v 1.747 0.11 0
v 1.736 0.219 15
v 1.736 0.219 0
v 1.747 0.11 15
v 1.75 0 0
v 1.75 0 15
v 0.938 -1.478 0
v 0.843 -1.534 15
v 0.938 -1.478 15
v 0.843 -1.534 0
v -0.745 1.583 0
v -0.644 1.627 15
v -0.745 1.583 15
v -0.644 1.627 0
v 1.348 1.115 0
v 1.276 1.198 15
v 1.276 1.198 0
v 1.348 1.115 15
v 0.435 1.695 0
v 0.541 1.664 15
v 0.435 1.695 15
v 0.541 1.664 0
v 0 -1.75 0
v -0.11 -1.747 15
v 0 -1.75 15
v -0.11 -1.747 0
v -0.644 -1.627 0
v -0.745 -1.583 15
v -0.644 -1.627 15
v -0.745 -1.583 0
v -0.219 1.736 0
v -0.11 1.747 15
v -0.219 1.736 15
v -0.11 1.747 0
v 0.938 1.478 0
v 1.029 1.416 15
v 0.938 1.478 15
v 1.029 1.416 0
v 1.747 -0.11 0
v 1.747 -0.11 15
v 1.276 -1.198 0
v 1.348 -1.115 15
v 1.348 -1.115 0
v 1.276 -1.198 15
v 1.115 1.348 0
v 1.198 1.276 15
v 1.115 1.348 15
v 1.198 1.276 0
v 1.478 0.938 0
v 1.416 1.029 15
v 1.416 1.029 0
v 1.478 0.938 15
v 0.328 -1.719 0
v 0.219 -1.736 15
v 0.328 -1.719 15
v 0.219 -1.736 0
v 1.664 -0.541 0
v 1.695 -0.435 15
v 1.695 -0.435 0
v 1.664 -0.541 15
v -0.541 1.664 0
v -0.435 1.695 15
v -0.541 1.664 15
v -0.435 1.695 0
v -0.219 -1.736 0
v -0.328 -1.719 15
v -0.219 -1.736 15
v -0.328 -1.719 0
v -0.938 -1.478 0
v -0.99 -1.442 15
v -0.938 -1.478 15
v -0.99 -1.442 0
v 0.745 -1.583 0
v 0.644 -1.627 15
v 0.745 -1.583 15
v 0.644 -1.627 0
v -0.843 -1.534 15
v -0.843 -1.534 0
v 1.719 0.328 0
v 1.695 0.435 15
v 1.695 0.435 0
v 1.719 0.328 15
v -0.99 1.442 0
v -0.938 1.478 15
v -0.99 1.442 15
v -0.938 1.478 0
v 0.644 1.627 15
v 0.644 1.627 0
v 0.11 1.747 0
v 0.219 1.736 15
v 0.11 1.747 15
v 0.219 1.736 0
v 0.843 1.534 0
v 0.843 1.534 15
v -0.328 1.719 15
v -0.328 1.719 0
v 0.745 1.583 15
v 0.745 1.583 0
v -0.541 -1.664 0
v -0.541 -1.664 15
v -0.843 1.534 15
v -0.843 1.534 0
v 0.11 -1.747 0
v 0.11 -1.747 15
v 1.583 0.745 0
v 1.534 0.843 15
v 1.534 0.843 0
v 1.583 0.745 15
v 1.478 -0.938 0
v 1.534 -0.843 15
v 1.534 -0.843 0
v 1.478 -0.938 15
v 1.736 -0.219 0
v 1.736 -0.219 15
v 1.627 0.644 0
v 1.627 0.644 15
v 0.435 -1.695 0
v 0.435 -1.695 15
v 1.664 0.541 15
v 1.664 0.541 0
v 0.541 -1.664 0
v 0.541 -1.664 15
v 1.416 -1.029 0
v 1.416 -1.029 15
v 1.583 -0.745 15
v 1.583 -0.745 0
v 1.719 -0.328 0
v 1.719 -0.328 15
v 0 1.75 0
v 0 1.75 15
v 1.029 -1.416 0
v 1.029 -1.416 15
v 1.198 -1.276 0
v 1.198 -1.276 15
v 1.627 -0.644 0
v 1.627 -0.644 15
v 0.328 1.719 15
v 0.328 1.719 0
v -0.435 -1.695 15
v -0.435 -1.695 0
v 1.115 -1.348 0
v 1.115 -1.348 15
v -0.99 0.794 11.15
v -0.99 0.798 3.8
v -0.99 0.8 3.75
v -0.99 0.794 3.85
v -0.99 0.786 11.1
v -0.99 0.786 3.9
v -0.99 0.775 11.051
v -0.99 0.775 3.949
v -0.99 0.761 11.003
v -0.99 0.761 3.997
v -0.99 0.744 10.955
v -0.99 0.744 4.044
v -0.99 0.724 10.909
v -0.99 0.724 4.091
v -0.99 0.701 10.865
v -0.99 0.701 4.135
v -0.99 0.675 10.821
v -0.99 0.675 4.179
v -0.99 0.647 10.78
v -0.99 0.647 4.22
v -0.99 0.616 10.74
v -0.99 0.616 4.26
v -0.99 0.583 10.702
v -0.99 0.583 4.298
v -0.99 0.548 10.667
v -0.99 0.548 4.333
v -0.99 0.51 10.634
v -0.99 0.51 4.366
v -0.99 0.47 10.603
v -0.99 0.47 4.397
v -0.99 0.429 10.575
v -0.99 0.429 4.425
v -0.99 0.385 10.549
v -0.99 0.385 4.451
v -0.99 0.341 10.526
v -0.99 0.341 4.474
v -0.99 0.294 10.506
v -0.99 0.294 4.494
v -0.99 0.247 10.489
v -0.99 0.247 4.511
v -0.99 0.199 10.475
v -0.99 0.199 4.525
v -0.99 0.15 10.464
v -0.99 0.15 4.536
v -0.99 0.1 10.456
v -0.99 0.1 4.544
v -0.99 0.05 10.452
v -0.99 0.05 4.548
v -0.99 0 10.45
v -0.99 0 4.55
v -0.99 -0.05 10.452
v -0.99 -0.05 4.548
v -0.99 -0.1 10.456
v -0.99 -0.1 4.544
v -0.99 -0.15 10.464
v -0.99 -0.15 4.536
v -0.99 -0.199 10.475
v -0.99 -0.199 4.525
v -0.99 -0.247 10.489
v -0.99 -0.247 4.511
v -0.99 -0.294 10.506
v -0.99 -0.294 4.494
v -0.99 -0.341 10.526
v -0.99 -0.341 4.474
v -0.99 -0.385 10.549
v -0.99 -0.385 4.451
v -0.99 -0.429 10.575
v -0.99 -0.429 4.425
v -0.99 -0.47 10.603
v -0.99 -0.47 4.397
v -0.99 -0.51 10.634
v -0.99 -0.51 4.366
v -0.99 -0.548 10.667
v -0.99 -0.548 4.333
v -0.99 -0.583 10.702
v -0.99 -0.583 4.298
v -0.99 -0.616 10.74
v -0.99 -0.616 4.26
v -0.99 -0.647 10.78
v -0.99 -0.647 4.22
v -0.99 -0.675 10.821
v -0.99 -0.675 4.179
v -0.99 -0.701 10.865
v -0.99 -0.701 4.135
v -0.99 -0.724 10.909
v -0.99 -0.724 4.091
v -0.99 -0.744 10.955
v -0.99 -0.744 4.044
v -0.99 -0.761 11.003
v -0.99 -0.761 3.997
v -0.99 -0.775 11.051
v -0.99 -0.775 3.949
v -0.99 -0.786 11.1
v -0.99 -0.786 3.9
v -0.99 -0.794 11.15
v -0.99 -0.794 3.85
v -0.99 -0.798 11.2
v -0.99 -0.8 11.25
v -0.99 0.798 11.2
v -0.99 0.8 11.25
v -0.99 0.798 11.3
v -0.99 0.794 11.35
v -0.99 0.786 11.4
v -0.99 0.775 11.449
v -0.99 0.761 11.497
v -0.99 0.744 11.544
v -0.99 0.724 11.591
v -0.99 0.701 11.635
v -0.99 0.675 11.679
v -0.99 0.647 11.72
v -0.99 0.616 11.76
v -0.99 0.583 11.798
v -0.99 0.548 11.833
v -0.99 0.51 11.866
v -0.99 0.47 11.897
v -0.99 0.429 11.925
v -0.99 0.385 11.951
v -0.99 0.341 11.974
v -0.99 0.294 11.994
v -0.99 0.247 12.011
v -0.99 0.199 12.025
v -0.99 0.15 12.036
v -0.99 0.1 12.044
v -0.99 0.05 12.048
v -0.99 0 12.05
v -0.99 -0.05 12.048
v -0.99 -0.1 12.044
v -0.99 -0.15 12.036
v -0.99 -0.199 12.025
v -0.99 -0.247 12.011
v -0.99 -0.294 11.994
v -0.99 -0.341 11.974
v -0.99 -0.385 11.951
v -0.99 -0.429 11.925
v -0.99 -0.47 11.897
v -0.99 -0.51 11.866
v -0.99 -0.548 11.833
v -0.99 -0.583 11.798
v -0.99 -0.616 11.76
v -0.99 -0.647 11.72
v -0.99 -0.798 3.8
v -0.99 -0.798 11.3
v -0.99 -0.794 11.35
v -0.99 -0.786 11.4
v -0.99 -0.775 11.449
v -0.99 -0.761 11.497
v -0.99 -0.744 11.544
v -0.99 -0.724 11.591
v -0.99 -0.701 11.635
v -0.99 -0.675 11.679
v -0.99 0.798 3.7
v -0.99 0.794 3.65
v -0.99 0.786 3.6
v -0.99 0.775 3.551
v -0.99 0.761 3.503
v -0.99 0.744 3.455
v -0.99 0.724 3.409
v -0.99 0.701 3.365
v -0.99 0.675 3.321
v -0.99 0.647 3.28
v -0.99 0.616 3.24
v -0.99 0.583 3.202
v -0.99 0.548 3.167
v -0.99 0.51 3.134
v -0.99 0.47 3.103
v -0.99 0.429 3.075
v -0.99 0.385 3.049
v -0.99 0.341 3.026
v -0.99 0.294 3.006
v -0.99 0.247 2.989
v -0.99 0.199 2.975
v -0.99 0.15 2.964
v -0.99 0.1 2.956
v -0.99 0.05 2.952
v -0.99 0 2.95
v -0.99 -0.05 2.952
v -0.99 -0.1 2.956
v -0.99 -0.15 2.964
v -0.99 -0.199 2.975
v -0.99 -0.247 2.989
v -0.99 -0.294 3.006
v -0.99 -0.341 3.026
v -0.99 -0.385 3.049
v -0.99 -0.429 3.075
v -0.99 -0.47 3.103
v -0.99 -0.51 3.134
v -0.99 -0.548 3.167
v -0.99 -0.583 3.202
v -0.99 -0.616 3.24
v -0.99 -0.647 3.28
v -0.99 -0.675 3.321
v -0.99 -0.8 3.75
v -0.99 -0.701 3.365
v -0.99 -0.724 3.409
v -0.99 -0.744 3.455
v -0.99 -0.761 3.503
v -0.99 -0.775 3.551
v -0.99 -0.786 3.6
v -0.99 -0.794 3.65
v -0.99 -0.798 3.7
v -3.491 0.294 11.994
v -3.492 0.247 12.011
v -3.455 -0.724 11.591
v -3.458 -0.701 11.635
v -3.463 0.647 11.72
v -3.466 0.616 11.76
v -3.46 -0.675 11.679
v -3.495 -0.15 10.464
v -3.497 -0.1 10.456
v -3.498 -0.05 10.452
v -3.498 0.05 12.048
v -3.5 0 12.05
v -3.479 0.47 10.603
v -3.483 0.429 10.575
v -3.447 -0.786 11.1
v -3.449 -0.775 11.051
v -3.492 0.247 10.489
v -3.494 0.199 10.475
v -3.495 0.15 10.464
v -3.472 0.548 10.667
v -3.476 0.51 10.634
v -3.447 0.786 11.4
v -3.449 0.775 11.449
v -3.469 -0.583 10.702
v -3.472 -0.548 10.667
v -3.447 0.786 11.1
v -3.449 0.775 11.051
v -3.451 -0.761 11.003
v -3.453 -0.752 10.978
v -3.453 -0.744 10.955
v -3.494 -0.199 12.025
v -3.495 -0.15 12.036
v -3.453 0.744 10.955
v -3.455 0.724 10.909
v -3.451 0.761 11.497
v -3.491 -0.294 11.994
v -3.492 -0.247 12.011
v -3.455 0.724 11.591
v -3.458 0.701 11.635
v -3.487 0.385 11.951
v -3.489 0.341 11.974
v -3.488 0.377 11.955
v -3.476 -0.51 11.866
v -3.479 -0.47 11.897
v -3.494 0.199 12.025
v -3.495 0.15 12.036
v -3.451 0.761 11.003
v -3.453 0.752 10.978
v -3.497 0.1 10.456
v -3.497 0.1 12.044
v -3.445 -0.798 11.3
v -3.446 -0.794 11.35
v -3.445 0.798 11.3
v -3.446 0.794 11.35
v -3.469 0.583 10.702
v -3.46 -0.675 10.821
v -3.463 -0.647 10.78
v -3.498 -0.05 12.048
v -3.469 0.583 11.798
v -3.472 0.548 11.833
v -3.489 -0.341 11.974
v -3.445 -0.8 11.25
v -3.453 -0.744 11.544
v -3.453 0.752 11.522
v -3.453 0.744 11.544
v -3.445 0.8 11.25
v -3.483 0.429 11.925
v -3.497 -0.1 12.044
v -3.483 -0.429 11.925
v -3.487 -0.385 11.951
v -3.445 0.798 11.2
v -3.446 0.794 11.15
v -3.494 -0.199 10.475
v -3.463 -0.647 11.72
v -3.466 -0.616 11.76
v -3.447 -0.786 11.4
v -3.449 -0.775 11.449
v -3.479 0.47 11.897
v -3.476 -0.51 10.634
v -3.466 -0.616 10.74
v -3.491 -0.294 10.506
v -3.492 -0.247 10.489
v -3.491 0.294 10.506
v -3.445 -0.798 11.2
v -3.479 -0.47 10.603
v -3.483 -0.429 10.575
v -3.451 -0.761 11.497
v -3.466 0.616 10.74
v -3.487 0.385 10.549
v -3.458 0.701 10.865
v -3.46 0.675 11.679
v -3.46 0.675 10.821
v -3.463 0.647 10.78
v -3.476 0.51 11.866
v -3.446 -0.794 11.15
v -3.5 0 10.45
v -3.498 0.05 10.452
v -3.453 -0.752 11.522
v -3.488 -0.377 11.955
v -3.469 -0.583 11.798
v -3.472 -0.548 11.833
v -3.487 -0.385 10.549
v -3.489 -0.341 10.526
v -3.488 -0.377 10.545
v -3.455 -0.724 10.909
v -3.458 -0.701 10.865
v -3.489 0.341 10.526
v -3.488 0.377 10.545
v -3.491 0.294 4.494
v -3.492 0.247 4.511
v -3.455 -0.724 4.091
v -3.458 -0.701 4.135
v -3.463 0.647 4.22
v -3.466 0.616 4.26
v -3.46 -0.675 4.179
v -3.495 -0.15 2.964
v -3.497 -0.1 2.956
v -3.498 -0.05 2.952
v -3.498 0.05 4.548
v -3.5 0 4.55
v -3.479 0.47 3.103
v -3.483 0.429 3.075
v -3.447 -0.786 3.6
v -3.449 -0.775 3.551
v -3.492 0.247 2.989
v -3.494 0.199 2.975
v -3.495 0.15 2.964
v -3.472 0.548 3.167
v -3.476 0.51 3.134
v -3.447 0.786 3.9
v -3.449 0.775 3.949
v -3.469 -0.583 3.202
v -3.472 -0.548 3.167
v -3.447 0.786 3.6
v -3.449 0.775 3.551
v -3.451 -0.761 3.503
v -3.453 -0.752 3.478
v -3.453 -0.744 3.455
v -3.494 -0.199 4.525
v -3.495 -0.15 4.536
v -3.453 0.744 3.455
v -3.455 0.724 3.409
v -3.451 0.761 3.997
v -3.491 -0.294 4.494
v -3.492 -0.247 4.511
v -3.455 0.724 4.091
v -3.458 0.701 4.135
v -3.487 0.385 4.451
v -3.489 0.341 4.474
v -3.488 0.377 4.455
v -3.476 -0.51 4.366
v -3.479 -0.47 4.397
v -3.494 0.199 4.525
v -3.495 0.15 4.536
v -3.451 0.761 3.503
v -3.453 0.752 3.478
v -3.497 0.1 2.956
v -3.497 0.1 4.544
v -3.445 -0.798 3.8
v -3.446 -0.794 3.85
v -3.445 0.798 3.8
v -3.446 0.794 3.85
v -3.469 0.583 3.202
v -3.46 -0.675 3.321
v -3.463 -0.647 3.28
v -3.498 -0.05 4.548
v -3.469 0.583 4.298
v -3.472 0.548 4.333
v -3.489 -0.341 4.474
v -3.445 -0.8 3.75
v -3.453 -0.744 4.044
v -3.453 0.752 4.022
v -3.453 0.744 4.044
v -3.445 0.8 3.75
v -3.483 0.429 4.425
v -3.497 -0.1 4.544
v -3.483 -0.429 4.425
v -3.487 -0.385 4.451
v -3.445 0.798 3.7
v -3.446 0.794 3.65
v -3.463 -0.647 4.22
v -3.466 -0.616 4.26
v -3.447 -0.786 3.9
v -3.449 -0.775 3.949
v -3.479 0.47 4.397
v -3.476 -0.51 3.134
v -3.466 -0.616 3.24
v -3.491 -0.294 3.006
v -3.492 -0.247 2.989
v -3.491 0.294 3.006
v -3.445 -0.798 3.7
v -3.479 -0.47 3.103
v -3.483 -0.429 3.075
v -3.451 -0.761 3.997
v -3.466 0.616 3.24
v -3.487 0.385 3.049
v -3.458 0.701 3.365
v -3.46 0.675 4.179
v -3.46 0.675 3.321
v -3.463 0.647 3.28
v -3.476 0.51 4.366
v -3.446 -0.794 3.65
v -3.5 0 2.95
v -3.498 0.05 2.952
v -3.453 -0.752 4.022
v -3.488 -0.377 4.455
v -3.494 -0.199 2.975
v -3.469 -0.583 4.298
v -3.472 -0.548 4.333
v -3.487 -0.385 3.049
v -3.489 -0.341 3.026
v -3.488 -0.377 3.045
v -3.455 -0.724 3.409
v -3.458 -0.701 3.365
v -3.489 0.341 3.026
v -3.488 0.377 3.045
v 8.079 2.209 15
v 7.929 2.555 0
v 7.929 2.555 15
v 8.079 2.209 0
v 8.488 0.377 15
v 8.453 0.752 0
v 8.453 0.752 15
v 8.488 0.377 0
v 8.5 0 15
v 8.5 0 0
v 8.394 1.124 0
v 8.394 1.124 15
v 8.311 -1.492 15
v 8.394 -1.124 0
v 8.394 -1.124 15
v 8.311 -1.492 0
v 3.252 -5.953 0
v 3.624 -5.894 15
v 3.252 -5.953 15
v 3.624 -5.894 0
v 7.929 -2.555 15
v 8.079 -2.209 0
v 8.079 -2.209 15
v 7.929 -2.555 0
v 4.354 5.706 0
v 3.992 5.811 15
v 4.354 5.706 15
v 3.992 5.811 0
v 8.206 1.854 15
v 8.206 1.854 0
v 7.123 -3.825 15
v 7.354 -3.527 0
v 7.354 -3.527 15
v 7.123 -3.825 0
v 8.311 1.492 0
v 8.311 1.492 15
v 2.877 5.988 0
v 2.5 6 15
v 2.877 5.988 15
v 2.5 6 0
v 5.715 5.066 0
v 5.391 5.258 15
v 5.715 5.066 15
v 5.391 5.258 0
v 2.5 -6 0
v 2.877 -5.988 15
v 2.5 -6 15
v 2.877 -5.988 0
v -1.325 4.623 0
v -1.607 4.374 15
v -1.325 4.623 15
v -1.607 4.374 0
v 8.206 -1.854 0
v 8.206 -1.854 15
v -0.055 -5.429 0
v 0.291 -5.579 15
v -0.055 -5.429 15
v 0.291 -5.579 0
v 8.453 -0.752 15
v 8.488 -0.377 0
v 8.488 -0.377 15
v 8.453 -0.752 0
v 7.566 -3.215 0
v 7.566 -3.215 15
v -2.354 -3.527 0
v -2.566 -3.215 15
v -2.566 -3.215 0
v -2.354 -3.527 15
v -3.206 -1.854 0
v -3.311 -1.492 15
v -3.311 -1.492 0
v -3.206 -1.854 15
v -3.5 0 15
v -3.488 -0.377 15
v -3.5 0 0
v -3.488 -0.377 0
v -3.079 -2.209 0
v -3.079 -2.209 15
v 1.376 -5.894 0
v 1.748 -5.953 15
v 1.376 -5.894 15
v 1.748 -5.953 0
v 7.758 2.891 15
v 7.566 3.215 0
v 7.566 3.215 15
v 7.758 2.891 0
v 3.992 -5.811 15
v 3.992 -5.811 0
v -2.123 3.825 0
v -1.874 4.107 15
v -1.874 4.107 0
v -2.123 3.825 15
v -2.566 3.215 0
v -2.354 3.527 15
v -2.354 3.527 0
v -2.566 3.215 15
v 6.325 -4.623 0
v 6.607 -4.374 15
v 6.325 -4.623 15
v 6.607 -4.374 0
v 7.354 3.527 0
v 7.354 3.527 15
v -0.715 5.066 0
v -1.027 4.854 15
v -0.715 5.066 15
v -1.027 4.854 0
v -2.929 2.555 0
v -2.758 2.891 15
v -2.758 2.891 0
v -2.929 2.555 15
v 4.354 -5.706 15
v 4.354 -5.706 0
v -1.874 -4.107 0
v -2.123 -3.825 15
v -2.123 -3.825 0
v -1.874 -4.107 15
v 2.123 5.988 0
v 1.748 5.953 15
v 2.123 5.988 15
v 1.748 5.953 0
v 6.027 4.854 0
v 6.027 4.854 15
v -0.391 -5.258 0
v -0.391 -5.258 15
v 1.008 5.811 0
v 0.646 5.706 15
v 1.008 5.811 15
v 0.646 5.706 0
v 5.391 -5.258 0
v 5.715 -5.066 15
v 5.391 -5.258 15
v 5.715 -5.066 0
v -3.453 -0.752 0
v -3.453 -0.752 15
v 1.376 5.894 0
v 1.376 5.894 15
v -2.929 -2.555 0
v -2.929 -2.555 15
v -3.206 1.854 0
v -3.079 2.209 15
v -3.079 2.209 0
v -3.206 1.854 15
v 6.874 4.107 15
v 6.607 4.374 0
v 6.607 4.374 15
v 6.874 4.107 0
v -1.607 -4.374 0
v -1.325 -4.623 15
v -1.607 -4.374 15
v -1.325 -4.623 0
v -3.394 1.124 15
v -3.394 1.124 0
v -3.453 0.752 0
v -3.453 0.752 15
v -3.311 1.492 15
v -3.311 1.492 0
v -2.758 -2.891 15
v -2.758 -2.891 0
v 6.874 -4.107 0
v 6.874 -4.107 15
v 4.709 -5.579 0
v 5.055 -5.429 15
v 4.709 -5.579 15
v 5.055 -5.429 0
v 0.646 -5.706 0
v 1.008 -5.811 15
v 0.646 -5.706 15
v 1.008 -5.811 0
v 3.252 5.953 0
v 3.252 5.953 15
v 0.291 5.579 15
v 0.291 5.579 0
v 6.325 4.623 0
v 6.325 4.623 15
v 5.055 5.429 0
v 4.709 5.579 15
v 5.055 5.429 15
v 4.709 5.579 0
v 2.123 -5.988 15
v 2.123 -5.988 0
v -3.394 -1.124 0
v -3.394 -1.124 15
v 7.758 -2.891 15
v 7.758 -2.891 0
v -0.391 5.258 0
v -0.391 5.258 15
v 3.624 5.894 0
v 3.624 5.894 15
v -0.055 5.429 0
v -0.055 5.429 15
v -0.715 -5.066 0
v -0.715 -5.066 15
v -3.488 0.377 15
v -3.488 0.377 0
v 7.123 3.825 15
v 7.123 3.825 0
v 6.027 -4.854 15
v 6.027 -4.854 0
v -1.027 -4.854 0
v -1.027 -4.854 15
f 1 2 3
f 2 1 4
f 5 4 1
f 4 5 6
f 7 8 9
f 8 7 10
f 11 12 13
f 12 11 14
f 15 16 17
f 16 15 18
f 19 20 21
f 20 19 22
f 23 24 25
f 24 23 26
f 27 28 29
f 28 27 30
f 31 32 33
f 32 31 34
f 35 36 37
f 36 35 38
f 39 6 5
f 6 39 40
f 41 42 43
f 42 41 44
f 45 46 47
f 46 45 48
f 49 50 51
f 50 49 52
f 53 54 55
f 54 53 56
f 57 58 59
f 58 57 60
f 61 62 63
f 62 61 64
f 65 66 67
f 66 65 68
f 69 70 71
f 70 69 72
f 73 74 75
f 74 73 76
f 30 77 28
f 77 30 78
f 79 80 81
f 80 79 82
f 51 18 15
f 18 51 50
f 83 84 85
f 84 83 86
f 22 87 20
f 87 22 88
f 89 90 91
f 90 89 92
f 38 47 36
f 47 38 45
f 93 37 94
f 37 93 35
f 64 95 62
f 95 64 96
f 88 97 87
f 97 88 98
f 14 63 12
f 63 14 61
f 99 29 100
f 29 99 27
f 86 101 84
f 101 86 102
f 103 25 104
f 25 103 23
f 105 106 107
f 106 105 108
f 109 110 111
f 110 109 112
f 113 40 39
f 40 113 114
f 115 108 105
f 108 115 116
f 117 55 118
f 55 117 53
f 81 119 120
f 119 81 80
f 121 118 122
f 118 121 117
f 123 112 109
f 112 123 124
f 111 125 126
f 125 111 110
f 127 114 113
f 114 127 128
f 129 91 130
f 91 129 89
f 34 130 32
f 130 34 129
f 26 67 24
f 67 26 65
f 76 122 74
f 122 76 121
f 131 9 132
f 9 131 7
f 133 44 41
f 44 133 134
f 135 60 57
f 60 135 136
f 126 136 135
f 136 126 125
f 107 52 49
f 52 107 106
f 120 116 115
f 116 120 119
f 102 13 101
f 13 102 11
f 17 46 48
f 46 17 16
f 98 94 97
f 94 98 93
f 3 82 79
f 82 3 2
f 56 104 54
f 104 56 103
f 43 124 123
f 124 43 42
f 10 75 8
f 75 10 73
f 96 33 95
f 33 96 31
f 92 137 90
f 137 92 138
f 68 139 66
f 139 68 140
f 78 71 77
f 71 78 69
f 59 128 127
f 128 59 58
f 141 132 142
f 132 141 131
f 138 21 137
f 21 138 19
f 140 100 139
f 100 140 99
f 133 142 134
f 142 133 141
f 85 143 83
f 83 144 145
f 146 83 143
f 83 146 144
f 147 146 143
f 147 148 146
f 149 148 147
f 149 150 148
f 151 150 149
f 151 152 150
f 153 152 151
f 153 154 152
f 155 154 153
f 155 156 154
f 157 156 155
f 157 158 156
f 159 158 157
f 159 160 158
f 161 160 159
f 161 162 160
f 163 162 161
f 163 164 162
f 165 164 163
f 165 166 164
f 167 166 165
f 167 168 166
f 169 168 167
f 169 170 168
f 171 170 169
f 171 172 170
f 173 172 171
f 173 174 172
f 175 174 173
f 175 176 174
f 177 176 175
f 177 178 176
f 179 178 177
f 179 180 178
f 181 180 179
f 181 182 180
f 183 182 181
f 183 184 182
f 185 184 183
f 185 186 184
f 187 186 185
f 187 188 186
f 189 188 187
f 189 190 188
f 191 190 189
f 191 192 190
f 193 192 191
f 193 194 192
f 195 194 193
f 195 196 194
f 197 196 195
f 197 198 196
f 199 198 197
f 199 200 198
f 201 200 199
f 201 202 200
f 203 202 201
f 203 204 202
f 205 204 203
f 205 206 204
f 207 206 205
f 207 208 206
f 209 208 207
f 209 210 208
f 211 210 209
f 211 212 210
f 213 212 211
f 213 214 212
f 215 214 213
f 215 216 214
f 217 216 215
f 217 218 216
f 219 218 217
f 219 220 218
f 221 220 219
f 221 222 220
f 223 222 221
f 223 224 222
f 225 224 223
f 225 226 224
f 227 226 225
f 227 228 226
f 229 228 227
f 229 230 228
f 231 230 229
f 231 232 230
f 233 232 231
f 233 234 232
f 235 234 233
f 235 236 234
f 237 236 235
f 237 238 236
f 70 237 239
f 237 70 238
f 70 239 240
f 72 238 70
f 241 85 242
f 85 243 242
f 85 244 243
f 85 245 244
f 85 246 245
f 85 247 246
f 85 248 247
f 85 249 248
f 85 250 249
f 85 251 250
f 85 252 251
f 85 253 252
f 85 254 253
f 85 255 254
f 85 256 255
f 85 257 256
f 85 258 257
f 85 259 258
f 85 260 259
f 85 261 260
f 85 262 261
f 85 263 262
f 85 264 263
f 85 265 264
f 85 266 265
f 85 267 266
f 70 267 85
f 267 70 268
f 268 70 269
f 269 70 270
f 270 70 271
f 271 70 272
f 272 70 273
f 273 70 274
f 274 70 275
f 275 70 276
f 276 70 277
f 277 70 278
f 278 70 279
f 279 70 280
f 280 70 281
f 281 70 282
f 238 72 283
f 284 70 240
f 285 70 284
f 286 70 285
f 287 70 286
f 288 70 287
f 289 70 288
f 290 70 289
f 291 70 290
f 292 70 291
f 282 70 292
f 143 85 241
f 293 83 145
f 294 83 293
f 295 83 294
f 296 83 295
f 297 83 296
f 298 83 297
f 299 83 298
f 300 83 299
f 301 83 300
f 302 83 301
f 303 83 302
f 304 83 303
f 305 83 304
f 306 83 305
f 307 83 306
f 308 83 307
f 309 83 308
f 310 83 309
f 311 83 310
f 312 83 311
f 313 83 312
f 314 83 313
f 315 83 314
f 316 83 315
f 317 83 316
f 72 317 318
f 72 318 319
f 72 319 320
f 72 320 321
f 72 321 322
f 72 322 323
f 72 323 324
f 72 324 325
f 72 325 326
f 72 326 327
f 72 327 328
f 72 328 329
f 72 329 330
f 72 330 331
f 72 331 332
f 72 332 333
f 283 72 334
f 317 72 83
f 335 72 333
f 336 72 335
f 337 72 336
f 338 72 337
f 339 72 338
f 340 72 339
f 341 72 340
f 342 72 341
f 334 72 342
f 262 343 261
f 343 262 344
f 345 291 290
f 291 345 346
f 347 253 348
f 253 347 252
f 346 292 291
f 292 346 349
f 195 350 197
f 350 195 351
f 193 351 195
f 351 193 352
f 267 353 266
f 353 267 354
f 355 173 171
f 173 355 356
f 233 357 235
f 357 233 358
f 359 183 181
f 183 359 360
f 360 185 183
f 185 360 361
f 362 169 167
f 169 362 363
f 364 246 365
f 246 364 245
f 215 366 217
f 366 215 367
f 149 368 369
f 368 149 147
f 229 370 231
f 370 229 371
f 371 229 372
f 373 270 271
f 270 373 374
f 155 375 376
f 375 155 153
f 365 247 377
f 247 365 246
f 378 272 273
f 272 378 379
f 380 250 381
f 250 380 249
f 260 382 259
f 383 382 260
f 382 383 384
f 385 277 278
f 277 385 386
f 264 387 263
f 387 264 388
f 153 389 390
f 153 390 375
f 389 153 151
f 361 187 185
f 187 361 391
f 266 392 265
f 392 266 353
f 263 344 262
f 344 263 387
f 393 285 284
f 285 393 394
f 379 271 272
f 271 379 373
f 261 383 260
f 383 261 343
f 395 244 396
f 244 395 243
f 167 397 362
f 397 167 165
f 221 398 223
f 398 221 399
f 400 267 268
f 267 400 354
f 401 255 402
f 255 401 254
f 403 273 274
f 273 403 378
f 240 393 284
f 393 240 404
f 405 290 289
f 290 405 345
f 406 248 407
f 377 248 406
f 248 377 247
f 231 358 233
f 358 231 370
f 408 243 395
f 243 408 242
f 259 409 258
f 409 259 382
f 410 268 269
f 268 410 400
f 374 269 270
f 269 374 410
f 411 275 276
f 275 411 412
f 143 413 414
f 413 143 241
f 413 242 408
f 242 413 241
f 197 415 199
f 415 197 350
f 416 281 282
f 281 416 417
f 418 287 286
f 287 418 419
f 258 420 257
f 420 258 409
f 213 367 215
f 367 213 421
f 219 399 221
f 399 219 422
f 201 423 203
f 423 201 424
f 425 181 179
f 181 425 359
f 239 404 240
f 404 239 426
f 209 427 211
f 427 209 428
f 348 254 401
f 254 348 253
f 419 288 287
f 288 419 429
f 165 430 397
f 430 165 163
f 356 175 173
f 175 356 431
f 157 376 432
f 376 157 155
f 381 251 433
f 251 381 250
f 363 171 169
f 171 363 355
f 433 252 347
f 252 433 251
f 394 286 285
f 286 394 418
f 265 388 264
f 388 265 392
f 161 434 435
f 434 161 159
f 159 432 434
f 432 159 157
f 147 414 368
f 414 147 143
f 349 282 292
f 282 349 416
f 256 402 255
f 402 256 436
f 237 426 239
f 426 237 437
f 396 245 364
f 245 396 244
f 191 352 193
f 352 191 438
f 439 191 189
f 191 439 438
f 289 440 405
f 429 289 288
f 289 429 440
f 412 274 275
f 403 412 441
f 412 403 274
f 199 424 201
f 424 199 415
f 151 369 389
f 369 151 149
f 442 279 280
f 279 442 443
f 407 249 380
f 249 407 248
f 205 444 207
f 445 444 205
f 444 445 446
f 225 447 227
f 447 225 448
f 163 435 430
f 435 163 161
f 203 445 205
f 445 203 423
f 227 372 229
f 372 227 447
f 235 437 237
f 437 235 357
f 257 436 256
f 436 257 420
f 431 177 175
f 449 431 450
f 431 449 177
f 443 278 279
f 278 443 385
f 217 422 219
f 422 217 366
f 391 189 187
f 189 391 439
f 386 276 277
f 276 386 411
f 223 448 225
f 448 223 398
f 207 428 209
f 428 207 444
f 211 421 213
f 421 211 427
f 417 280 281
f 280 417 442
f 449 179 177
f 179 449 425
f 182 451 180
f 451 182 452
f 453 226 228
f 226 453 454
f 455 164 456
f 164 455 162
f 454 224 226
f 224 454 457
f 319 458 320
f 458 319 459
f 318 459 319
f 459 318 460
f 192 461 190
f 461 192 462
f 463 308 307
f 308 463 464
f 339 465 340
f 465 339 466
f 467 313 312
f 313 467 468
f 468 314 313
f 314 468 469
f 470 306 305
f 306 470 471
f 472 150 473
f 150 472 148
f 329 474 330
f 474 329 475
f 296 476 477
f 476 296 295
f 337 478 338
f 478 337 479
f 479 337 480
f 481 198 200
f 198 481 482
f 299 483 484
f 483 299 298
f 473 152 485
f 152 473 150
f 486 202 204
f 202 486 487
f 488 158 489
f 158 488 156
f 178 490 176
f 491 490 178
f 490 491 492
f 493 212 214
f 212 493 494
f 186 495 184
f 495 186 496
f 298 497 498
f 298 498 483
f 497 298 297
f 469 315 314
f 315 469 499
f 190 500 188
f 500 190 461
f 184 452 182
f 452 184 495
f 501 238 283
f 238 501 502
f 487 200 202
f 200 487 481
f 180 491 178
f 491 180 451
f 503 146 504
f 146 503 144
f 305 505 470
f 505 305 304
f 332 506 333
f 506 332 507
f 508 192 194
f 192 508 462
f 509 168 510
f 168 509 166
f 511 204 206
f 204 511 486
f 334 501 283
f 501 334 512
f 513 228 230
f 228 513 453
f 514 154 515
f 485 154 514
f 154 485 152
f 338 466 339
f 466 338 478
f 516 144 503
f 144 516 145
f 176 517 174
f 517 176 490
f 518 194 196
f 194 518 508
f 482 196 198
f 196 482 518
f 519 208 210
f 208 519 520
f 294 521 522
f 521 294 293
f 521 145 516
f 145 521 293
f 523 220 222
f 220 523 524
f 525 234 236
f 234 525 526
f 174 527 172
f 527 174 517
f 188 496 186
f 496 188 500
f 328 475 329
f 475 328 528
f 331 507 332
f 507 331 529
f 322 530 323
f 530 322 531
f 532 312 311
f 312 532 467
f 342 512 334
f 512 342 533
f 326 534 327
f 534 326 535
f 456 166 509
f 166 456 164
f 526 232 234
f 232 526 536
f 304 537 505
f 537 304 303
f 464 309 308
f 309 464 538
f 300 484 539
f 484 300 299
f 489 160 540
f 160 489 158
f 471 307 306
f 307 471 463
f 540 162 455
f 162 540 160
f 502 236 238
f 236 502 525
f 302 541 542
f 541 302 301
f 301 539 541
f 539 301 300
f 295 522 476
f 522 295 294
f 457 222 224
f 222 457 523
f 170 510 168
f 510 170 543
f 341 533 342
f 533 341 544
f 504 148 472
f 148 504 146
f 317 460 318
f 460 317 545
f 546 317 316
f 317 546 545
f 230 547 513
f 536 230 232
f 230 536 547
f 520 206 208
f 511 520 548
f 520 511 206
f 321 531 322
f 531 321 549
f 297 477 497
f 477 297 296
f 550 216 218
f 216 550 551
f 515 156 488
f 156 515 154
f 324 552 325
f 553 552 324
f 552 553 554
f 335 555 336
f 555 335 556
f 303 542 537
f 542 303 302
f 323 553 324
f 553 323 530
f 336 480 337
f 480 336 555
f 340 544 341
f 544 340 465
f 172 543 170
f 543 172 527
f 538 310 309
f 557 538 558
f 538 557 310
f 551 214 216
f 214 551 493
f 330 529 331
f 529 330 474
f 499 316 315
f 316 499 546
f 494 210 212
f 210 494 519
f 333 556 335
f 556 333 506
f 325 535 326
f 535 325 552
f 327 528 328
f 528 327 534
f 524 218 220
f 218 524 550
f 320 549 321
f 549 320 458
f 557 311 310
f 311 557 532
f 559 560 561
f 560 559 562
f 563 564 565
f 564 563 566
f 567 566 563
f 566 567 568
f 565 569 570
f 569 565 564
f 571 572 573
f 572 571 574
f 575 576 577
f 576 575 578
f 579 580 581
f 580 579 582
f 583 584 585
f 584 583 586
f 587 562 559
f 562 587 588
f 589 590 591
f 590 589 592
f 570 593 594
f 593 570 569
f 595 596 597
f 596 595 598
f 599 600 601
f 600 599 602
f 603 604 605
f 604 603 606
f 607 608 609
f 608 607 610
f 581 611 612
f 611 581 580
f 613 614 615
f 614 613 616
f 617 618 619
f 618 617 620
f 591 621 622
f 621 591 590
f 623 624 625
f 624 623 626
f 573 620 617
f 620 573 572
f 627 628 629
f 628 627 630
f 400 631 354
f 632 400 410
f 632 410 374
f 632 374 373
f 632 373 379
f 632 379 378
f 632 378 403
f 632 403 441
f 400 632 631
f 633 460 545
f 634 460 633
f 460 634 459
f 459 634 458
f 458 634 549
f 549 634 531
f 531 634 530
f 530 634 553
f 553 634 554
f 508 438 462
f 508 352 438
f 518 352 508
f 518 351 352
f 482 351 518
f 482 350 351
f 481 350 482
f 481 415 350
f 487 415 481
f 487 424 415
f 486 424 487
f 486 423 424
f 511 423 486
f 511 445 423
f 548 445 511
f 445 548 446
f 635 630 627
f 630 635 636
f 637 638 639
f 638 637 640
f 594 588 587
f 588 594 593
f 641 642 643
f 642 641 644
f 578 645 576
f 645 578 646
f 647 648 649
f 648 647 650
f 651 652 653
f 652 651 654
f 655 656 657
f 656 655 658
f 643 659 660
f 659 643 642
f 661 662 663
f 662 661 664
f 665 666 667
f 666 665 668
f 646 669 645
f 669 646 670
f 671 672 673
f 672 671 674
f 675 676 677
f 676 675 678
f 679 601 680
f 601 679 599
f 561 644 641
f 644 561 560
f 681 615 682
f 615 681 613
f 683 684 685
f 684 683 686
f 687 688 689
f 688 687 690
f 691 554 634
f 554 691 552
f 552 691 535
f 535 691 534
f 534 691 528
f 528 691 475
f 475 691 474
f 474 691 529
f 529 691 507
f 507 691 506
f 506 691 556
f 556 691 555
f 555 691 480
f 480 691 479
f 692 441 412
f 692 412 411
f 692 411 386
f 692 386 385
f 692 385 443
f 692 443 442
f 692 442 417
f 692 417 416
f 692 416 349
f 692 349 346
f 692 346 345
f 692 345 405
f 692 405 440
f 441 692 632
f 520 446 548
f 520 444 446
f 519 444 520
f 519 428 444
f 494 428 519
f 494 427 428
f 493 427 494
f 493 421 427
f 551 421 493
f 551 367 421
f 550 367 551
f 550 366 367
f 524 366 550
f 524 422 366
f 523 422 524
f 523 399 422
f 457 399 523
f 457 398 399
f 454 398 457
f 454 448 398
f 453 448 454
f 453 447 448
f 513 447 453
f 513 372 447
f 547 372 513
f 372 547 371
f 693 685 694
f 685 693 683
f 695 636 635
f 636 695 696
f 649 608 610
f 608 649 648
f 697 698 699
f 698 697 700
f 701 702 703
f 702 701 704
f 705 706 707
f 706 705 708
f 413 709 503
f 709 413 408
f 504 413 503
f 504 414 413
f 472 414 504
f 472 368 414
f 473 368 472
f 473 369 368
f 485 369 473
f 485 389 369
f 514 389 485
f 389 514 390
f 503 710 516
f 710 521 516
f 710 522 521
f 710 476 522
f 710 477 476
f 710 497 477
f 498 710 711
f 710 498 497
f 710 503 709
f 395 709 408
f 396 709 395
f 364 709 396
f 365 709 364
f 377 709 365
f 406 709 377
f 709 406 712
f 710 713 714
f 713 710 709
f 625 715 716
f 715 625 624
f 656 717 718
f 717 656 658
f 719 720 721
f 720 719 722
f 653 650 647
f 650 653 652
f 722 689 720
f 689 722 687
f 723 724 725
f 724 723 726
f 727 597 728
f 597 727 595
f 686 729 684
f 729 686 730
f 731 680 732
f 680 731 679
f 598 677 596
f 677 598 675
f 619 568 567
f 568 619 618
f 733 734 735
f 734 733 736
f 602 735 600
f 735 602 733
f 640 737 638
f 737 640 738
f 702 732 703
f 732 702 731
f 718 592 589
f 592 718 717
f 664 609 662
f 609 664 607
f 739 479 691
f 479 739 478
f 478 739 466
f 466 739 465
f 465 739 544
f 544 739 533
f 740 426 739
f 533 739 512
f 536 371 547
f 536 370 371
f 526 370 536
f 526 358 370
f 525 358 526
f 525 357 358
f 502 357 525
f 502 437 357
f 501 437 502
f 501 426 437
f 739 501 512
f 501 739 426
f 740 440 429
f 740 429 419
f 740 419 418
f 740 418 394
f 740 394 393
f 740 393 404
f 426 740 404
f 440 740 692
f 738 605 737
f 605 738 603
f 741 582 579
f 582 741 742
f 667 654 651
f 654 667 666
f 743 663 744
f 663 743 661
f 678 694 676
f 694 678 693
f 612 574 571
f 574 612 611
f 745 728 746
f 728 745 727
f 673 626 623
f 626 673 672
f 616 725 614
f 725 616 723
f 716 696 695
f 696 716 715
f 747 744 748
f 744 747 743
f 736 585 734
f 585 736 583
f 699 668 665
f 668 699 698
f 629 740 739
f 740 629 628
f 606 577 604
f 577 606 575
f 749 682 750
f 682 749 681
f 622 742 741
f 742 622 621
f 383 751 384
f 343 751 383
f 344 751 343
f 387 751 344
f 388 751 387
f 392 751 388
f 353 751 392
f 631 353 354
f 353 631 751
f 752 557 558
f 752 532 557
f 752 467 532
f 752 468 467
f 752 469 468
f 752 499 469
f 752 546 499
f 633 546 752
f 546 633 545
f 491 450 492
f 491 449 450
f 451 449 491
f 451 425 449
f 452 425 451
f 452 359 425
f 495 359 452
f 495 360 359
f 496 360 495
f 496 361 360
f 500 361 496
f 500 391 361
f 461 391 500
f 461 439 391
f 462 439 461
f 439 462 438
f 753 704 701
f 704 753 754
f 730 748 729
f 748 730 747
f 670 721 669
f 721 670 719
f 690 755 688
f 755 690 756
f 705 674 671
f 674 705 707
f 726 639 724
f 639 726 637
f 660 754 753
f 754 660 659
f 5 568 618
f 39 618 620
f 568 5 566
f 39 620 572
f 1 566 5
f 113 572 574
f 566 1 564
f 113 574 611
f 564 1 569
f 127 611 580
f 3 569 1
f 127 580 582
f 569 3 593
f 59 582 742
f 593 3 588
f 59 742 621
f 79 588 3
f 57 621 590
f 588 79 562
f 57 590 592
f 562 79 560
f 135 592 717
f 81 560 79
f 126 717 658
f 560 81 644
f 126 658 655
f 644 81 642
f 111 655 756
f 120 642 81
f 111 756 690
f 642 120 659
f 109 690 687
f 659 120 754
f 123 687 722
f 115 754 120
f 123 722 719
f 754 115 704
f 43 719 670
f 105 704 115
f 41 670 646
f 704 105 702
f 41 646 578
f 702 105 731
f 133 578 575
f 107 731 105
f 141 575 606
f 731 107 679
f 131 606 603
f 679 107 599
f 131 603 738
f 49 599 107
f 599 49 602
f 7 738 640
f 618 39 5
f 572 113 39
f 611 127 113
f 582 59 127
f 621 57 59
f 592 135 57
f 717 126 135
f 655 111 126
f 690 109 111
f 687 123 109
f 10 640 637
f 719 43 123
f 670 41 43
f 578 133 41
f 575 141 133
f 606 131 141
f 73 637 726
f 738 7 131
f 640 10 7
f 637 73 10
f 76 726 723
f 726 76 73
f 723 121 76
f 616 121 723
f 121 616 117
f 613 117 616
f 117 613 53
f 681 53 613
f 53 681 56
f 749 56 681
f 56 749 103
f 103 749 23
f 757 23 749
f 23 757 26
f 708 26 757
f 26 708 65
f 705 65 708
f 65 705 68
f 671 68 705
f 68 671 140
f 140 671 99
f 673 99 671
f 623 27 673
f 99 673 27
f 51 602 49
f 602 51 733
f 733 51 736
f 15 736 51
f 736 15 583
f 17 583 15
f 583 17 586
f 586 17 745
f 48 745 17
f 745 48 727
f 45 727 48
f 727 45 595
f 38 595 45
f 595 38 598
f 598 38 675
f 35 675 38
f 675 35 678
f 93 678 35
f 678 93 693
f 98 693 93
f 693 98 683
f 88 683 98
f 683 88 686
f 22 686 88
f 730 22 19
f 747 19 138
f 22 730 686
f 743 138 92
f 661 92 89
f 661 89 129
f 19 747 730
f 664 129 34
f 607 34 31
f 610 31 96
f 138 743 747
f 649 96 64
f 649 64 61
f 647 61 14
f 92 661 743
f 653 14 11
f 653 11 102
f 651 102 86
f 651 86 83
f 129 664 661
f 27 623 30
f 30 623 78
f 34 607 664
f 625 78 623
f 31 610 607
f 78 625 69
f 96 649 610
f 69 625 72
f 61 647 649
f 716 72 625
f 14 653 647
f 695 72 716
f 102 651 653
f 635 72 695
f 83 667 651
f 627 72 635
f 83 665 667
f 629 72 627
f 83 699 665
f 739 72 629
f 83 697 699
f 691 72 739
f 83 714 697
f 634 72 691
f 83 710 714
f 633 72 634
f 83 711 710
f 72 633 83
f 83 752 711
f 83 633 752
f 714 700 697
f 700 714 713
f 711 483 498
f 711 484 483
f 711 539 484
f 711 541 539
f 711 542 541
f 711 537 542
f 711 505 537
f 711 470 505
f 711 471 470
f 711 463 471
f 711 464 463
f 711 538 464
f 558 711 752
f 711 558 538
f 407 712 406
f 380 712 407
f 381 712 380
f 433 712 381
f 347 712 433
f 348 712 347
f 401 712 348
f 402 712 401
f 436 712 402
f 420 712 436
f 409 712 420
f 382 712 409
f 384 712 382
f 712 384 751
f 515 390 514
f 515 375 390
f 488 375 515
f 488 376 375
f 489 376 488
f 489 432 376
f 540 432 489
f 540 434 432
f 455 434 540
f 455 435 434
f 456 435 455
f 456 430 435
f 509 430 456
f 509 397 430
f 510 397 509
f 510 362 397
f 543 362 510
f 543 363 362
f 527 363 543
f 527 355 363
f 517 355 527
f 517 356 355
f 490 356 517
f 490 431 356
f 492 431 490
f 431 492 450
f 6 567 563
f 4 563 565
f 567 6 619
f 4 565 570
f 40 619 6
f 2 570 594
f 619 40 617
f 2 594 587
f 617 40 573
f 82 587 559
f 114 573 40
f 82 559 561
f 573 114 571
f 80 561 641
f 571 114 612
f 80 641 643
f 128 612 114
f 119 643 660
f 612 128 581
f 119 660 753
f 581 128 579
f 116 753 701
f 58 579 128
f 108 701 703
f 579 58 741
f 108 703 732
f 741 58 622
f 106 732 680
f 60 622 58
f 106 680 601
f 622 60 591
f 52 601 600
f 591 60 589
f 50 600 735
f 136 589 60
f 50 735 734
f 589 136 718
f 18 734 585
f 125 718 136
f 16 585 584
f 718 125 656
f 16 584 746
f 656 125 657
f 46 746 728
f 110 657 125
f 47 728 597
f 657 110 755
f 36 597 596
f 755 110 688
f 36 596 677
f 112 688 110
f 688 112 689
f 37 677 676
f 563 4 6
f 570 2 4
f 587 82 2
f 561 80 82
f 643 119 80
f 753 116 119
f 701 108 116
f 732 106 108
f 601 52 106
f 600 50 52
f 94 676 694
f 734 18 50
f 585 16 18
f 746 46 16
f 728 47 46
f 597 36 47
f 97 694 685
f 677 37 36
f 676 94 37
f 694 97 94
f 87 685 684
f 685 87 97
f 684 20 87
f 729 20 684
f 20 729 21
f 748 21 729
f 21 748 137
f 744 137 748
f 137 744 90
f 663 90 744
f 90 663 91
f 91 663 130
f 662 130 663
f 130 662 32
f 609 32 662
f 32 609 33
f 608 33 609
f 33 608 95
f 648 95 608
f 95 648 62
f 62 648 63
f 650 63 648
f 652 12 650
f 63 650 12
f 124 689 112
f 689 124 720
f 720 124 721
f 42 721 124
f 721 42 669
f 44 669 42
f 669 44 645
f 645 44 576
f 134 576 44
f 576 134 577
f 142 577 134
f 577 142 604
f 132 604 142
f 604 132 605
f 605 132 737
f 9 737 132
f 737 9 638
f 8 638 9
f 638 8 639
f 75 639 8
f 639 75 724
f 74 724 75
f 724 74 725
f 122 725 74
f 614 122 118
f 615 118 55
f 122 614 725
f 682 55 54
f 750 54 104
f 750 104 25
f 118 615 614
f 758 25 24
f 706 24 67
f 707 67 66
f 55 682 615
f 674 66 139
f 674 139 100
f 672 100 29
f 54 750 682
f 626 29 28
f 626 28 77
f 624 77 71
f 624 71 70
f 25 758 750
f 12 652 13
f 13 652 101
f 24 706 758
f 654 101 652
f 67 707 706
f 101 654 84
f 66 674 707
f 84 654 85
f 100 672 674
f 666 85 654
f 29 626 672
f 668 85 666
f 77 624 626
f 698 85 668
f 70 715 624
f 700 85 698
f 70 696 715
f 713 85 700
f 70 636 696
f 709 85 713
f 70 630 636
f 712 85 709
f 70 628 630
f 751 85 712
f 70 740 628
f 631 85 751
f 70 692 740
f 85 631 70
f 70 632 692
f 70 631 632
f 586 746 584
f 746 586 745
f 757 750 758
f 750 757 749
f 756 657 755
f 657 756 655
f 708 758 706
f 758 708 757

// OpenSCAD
//=============================
//  Eccentric shaft adapter for 3mm motor shaft
//      Designed for Pololu micro gear motors or any 3mm motor shaft
//
//  Designed by Andrew Moore, May 2016
//      http://www.thingiverse.com/TacPar
//
//      For questions, suggestions, or whatever, 
//      please PM me through thingiverse.
//
//      This work is licensed under a Creative Commons 
//      Attribution-ShareAlike 4.0 International License.
//      http://creativecommons.org/licenses/by-sa/4.0/


//=============================
//Constants
//=============================
inch = 25.4;

//=============================
//Render Variables
//=============================
$fn=100;


//=============================
//Mechanical Part Variables
//=============================
Eccentricity = 2.5; //set to 0 if you just want a big wheel.
                    //set for 5mm stroke 
                    //1mm eccentricity = 2mm stroke
                    //2mm = 4mm stroke
                    //3mm = 6mm stroke
Body_Dia = 12;
Body_Height = 15;
Shaft_Dia = 3;
Shaft_Tolerance = 0.25; //oversized radius for motor shaft hole
Key_Depth = .17; //how deep keyed cut is in motor shaft; default 20% = 0.2

//Sanity Checks on Dimensions... right now this error checking is not actually used for anything.
Dimension_Error = false;
if (Shaft_Tolerance >1)or (Body_Dia-(Shaft_Dia+Shaft_Tolerance+Eccentricity)<1)
{
    Dimension_Error = true;
}


module 3mmShaftAdapter()
{
	
	difference()
	{
		positives();
		negatives();
	}
	//add ons in areas that were erased...
	
	module positives()
	{
        translate([Eccentricity,0,Body_Height/2]) cylinder(r=Body_Dia/2, h=Body_Height, center=true);
	}

	module negatives()
	{


		//keyed shaft
		translate([0,0,0.1]) difference()
		{
			cylinder(r=Shaft_Dia/2+Shaft_Tolerance, h=2*Body_Height,  center=true);
			translate([(Key_Depth-1)*Shaft_Dia,0,0]) cube([Shaft_Dia,Shaft_Dia,2*Body_Height], center=true);
		}
		
		//set-screw holes at 25% and 75% of overall length
		translate([0,0,0.75*Body_Height]) rotate([0,-90,0])cylinder(r=.8, h=2*Body_Height);
        translate([0,0,0.25*Body_Height]) rotate([0,-90,0])cylinder(r=.8, h=2*Body_Height);
	}

}


3mmShaftAdapter();
